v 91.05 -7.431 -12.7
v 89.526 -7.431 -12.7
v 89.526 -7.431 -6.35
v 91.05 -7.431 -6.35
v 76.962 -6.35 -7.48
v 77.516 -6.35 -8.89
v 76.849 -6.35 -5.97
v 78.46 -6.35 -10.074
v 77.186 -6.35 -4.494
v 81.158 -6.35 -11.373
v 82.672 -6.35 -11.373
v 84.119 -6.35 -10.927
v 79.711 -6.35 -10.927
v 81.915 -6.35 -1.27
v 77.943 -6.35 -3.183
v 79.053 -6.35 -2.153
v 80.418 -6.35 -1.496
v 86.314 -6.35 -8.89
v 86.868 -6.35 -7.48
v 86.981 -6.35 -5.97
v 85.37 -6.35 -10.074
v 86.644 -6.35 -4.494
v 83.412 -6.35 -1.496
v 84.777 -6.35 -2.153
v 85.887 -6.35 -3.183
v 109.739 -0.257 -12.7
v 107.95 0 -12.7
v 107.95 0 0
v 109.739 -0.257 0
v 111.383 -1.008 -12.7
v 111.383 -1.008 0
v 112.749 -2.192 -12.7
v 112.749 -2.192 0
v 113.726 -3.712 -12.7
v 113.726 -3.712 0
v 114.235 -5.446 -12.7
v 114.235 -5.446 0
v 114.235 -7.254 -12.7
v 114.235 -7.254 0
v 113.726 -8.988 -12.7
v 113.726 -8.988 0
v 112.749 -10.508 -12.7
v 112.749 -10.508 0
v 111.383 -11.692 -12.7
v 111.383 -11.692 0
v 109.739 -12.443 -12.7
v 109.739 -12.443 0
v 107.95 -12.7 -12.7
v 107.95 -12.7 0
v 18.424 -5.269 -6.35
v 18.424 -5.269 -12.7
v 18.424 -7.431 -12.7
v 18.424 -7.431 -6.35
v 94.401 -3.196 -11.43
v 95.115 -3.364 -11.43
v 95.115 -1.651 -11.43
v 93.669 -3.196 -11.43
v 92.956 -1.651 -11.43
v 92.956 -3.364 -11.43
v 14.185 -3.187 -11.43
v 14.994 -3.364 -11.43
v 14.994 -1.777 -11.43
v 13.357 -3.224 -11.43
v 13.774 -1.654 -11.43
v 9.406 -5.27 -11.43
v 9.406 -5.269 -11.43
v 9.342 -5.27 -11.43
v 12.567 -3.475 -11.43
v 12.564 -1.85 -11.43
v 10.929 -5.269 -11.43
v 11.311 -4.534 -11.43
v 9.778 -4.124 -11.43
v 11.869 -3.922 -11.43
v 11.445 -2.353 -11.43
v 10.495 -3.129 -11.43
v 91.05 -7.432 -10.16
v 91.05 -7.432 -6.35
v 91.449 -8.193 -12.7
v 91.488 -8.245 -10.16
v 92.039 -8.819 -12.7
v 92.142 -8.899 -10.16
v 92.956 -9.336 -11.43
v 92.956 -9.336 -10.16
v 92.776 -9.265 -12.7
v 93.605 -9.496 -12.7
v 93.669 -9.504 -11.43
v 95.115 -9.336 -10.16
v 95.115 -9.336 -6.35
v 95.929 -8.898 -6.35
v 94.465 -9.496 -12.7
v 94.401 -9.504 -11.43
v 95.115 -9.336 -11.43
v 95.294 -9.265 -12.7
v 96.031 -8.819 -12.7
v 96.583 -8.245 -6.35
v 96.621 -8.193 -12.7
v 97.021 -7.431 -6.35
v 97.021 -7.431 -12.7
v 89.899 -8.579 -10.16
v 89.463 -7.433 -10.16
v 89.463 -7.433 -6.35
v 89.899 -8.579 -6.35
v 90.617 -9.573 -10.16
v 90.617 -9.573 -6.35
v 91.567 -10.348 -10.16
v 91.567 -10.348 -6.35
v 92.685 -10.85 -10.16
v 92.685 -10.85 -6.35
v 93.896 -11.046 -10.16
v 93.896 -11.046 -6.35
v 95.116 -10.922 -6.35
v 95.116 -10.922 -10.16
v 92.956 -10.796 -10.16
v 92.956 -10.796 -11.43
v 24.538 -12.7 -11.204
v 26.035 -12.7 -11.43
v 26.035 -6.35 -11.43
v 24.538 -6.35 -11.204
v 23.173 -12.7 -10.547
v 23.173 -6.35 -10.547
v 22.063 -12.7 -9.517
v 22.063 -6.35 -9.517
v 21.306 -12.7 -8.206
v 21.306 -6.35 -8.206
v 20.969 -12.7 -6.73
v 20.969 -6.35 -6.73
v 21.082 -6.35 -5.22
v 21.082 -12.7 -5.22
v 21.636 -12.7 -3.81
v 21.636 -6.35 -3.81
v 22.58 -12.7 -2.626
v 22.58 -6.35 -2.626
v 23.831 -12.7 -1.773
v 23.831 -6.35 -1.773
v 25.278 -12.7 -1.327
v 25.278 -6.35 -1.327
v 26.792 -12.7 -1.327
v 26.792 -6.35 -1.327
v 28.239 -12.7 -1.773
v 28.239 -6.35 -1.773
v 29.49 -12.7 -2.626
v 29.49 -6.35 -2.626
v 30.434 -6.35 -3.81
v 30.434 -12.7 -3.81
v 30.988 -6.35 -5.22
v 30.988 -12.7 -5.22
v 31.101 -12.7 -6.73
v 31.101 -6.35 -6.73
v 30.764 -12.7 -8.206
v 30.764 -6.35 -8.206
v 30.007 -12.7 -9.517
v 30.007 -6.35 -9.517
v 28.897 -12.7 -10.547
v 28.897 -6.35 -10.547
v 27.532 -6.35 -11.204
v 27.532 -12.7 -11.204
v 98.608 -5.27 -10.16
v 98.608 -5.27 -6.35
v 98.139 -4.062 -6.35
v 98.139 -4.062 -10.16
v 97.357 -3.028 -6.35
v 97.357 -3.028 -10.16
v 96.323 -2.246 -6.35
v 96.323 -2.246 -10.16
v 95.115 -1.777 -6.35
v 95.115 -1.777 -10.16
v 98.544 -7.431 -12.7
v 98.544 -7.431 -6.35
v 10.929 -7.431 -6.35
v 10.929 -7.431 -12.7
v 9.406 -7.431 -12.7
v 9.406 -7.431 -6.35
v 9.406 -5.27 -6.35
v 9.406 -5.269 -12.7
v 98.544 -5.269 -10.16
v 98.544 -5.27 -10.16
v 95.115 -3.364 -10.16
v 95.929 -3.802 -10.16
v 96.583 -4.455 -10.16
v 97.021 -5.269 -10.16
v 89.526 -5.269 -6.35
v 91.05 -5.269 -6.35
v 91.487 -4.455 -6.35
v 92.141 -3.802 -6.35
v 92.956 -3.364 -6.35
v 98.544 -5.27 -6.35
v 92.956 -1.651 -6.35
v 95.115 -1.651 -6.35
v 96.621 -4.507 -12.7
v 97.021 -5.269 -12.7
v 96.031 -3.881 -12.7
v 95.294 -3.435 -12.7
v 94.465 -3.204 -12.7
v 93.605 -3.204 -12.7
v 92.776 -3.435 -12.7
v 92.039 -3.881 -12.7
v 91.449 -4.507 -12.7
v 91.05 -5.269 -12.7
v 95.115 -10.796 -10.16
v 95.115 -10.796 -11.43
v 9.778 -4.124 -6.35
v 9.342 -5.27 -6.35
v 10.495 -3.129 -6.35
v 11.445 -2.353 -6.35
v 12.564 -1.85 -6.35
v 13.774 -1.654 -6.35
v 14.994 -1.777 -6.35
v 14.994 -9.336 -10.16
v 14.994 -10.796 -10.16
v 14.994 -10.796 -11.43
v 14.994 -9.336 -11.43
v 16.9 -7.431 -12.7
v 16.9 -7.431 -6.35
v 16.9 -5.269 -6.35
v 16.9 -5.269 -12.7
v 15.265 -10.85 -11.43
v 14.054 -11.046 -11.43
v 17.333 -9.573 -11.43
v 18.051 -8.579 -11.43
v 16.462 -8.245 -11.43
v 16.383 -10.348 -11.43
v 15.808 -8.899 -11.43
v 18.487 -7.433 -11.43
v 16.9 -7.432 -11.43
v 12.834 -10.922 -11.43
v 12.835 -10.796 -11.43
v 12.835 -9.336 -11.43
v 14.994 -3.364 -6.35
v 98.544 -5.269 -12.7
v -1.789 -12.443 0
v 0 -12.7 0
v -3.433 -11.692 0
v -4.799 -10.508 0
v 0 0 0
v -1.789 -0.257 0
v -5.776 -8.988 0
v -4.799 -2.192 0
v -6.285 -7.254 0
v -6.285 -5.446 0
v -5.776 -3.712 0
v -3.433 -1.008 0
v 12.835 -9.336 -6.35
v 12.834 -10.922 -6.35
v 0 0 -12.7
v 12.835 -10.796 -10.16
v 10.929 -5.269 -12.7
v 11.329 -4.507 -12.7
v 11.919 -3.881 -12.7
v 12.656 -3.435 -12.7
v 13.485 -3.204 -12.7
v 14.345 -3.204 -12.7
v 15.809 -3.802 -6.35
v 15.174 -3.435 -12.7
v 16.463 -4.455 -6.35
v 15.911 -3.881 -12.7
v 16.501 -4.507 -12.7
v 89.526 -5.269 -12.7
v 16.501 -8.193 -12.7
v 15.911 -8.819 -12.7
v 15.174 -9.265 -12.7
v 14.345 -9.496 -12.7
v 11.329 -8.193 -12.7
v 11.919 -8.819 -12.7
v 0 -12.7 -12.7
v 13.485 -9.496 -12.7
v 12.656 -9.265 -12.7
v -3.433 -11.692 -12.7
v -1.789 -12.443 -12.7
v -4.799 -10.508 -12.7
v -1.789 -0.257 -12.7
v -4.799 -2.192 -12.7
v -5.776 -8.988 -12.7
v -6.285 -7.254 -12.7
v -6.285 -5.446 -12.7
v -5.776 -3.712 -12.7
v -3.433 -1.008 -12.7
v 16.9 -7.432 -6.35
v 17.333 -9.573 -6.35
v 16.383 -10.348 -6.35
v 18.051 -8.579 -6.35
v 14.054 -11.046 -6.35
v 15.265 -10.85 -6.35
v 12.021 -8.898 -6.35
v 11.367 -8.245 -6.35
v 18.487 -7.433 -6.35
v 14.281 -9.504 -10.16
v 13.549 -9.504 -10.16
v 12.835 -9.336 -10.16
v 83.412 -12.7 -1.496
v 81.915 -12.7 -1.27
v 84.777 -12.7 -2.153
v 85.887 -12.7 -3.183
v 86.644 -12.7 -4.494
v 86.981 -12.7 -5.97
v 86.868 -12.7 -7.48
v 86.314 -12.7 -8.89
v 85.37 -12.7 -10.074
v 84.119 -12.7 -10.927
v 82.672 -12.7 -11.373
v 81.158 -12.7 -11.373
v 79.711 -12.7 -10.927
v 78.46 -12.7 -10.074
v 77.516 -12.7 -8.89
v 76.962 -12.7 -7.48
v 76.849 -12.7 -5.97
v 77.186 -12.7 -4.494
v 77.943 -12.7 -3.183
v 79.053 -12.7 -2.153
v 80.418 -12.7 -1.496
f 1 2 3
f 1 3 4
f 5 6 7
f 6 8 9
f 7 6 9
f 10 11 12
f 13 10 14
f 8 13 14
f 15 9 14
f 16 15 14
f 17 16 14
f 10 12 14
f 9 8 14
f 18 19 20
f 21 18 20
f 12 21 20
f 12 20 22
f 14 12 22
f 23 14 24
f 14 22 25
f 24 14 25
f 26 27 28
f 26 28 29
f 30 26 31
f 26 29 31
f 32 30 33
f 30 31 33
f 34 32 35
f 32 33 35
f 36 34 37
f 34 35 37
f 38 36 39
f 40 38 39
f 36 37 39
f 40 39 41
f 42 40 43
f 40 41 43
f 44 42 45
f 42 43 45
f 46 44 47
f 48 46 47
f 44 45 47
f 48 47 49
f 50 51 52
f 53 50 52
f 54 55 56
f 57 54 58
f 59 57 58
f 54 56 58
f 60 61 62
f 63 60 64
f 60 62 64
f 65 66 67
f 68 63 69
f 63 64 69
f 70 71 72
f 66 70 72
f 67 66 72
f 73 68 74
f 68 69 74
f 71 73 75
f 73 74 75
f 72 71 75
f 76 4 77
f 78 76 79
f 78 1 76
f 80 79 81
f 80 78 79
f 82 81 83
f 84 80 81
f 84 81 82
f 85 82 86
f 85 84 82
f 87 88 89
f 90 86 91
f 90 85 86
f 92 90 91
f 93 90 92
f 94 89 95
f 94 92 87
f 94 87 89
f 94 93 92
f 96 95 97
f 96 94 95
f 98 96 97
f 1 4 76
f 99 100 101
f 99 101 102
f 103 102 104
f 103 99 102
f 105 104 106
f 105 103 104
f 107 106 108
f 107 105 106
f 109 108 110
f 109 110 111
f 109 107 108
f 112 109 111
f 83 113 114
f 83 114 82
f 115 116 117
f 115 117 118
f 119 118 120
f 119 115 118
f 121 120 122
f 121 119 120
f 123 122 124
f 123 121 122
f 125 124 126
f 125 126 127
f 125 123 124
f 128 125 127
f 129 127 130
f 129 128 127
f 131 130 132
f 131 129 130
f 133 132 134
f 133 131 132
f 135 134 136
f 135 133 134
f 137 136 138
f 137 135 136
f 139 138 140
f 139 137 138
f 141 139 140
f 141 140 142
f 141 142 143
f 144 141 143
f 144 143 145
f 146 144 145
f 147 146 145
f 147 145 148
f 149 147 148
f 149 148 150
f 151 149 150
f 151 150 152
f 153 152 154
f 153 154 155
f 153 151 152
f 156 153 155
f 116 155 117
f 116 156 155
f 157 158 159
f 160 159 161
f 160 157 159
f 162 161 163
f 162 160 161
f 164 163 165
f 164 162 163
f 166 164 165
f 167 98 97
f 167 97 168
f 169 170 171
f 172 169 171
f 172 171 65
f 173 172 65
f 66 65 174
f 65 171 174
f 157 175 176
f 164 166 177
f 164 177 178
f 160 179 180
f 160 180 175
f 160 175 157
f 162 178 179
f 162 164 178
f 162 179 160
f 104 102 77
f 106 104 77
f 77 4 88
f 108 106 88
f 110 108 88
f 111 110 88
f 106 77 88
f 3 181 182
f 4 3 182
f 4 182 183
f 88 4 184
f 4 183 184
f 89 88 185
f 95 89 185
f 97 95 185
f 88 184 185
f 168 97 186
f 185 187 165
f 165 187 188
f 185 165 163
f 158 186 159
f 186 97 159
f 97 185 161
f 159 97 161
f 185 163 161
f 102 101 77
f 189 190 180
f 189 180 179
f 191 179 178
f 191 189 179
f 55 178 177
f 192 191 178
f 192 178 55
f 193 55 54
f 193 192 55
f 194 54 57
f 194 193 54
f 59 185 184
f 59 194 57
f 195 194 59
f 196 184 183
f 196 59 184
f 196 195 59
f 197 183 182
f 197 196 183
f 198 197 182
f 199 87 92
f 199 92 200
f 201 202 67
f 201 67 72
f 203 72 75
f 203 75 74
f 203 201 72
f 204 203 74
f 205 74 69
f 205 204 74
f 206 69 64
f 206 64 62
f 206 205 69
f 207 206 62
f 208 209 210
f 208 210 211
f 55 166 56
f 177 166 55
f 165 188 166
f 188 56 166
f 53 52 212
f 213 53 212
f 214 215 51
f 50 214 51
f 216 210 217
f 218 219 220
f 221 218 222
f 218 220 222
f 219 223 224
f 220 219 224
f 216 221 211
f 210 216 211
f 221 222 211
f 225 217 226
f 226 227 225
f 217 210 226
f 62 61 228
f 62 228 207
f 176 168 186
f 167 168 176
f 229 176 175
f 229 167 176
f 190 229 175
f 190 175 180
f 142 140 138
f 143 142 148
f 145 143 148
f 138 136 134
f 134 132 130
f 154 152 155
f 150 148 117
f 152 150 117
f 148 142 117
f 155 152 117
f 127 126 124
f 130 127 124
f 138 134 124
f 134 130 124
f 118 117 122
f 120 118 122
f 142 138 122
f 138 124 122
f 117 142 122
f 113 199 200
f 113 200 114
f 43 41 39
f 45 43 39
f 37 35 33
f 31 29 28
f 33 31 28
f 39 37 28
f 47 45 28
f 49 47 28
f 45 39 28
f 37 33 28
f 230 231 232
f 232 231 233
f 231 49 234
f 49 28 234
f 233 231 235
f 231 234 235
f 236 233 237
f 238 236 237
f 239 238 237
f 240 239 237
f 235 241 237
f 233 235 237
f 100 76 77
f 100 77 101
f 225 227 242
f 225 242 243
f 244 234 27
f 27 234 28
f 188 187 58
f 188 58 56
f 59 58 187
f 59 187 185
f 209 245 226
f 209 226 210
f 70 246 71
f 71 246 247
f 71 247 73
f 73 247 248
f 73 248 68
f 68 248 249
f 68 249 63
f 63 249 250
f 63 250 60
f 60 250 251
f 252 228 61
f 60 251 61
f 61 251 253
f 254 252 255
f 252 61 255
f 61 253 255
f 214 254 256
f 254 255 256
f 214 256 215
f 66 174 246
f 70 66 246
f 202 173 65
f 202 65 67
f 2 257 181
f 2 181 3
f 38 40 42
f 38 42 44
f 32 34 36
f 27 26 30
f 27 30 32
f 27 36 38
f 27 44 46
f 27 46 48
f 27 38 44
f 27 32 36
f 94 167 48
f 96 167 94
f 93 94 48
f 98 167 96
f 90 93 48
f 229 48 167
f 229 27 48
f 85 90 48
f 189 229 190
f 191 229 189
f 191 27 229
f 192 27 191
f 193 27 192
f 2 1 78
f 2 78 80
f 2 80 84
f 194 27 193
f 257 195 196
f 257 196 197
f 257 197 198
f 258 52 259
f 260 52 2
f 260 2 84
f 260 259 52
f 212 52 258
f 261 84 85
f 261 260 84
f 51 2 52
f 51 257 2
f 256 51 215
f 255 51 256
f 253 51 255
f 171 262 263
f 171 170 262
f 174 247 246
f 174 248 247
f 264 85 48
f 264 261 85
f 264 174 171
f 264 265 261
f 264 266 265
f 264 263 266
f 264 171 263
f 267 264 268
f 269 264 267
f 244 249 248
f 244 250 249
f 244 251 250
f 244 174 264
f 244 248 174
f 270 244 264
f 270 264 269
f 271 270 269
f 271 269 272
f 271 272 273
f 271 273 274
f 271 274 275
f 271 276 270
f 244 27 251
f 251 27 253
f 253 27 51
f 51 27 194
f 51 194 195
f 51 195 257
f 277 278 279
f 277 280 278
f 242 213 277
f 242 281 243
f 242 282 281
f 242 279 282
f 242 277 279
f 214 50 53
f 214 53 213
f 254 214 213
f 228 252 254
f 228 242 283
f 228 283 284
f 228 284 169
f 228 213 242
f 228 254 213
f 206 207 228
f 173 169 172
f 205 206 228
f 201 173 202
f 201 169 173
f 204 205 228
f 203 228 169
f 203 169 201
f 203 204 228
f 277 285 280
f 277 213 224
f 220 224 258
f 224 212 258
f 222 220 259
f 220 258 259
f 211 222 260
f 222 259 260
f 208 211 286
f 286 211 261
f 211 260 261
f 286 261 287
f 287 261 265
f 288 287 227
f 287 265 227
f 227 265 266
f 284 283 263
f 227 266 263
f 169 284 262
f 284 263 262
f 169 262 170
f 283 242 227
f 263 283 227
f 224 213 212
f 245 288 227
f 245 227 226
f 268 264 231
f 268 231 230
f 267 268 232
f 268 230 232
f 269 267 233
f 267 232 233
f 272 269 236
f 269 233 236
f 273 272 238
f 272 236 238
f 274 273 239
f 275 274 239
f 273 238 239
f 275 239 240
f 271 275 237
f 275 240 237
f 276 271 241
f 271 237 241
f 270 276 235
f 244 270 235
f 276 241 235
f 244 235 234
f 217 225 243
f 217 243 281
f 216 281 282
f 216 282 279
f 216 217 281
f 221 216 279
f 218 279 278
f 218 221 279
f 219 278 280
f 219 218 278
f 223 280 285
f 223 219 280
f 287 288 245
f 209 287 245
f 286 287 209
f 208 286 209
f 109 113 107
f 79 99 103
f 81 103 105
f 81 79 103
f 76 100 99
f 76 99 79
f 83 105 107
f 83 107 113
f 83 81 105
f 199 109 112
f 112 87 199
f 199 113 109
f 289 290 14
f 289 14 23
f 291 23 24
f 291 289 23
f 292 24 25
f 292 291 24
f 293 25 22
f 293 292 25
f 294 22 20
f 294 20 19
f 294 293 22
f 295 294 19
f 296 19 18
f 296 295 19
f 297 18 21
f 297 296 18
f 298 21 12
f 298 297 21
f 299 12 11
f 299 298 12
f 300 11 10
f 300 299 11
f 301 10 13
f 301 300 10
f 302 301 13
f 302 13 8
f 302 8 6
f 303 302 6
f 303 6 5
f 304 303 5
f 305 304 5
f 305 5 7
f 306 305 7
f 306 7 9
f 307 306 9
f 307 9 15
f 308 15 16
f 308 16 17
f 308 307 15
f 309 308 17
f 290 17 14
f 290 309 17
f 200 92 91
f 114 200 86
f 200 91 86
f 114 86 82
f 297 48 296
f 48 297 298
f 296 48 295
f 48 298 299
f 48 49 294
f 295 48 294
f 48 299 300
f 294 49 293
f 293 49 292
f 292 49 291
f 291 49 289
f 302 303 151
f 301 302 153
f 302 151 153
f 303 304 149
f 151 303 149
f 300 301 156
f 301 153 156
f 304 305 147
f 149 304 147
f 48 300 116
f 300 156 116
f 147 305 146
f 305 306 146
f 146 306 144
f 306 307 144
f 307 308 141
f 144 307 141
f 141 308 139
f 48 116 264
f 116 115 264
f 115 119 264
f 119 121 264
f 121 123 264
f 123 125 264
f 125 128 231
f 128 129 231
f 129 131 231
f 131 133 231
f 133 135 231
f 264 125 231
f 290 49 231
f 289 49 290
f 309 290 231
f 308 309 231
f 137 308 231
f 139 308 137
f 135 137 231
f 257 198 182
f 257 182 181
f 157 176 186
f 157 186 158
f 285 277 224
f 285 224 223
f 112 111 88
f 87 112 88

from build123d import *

# Parameters (mm, degrees)
BOSS_EXTRUDE1_DEPTH = 12.7
CUT_EXTRUDE1_DEPTH  = 6.35
CUT_EXTRUDE4_START  = 3.81
CUT_EXTRUDE4_DEPTH  = 3.81
CUT_EXTRUDE5_DEPTH  = 5.08
SKETCH5_R           = 5.08
CUT_EXTRUDE6_DEPTH  = 6.35


# Read off the part's stored shape, not the designer's step: Cut-Extrude5
with BuildPart() as part:
    # Sketch1 → Boss-Extrude1 (new body)
    with BuildSketch(Plane.XY):
        with BuildLine():
            Line((0, 0), (107.95, 0))
            ThreePointArc((107.95, 0), (114.3, -6.35), (107.95, -12.7))
            Line((107.95, -12.7), (0, -12.7))
            ThreePointArc((0, -12.7), (-6.35, -6.35), (0, 0))
        make_face()
    extrude(amount=-BOSS_EXTRUDE1_DEPTH)

    # Sketch2 → Cut-Extrude1 (cut)
    with BuildSketch(Plane(origin=(0, 0, -12.7), x_dir=(-1, 0, 0), z_dir=(0, 0, -1))):
        with BuildLine():
            Line((-98.543781691, -5.269443984), (-97.020546117, -5.269443984))
            ThreePointArc((-97.020546117, -5.269443984), (-94.03507736, -3.175), (-91.049608603, -5.269443984))
            Line((-91.049608603, -5.269443984), (-89.526373029, -5.269443984))
            Line((-89.526373029, -5.269443984), (-89.526373029, -7.430556016))
            Line((-89.526373029, -7.430556016), (-91.049608603, -7.430556016))
            ThreePointArc((-91.049608603, -7.430556016), (-94.03507736, -9.525), (-97.020546117, -7.430556016))
            Line((-97.020546117, -7.430556016), (-98.543781691, -7.430556016))
            Line((-98.543781691, -7.430556016), (-98.543781691, -5.269443984))
        make_face()
        with BuildLine():
            Line((-18.423626971, -5.269443984), (-18.423626971, -7.430556016))
            Line((-18.423626971, -7.430556016), (-16.900391397, -7.430556016))
            ThreePointArc((-16.900391397, -7.430556016), (-13.91492264, -9.525), (-10.929453883, -7.430556016))
            Line((-10.929453883, -7.430556016), (-9.406218309, -7.430556016))
            Line((-9.406218309, -7.430556016), (-9.406218309, -5.269443984))
            Line((-9.406218309, -5.269443984), (-10.929453883, -5.269443984))
            ThreePointArc((-10.929453883, -5.269443984), (-13.91492264, -3.175), (-16.900391397, -5.269443984))
            Line((-16.900391397, -5.269443984), (-18.423626971, -5.269443984))
        make_face()
    extrude(amount=-CUT_EXTRUDE1_DEPTH, mode=Mode.SUBTRACT)

    # Sketch3 → Cut-Extrude4 (cut)
    with BuildSketch(Plane(origin=(0, 0, -6.35), x_dir=(-1, 0, 0), z_dir=(0, 0, -1)).offset(CUT_EXTRUDE4_START)):
        with BuildLine():
            ThreePointArc((-14.99442264, -1.777413667), (-11.444937607, -2.353371426), (-9.342336307, -5.2705))
            Line((-9.342336307, -5.2705), (-10.929071882, -5.2705))
            ThreePointArc((-10.929071882, -5.2705), (-12.566929092, -3.475362911), (-14.99442264, -3.364149242))
            Line((-14.99442264, -3.364149242), (-14.99442264, -1.777413667))
        make_face()
        with BuildLine():
            ThreePointArc((-12.834322649, -10.922326506), (-16.383098929, -10.347745843), (-18.486790701, -7.432537968))
            Line((-18.486790701, -7.432537968), (-16.900008973, -7.431612032))
            ThreePointArc((-16.900008973, -7.431612032), (-15.26155345, -9.225275719), (-12.834704368, -9.335590978))
            Line((-12.834704368, -9.335590978), (-12.834322649, -10.922326506))
        make_face()
        with BuildLine():
            ThreePointArc((-95.115295632, -9.335590978), (-92.68844655, -9.225275719), (-91.049991027, -7.431612032))
            Line((-91.049991027, -7.431612032), (-89.463209299, -7.432537968))
            ThreePointArc((-89.463209299, -7.432537968), (-91.566901071, -10.347745843), (-95.115677351, -10.922326506))
            Line((-95.115677351, -10.922326506), (-95.115295632, -9.335590978))
        make_face()
        with BuildLine():
            ThreePointArc((-92.95557736, -3.364149242), (-95.383070908, -3.475362911), (-97.020928118, -5.2705))
            Line((-97.020928118, -5.2705), (-98.607663693, -5.2705))
            ThreePointArc((-98.607663693, -5.2705), (-96.505062393, -2.353371426), (-92.95557736, -1.777413667))
            Line((-92.95557736, -1.777413667), (-92.95557736, -3.364149242))
        make_face()
    extrude(amount=-CUT_EXTRUDE4_DEPTH, mode=Mode.SUBTRACT)

    # Cut-Extrude5 outline → Cut-Extrude5 (cut)
    with BuildSketch(Plane(origin=(0, 0, -6.35), x_dir=(-1, 0, 0), z_dir=(0, 0, -1))):
        with BuildLine():
            ThreePointArc((-9.342336307, -5.2705), (-11.444937607, -2.353371426), (-14.99442264, -1.777413667))
            Line((-14.99442264, -1.777413667), (-14.99442264, -3.364149242))
            ThreePointArc((-14.99442264, -3.364149242), (-12.567437486, -3.475124566), (-10.929453883, -5.269443984))
            Line((-10.929453883, -5.269443984), (-9.406218309, -5.269443984))
            Line((-9.406218309, -5.269443984), (-9.406218309, -5.2705))
            Line((-9.406218309, -5.2705), (-9.342336307, -5.2705))
        make_face()
        with BuildLine():
            ThreePointArc((-18.486790701, -7.432537968), (-16.383098929, -10.347745843), (-12.834322649, -10.922326506))
            Line((-12.834322649, -10.922326506), (-12.834704368, -9.335590978))
            ThreePointArc((-12.834704368, -9.335590978), (-12.835063496, -9.335720889), (-12.83542264, -9.335850758))
            Line((-12.83542264, -9.335850758), (-12.83542264, -10.796172665))
            Line((-12.83542264, -10.796172665), (-14.99442264, -10.796172665))
            Line((-14.99442264, -10.796172665), (-14.99442264, -9.335850758))
            ThreePointArc((-14.99442264, -9.335850758), (-16.159192409, -8.595858011), (-16.900008973, -7.431612032))
            Line((-16.900008973, -7.431612032), (-18.486790701, -7.432537968))
        make_face()
        with BuildLine():
            ThreePointArc((-95.11457736, -3.364149242), (-94.03507736, -3.175), (-92.95557736, -3.364149242))
            Line((-92.95557736, -3.364149242), (-92.95557736, -1.651))
            Line((-92.95557736, -1.651), (-95.11457736, -1.651))
            Line((-95.11457736, -1.651), (-95.11457736, -3.364149242))
        make_face()
        with BuildLine():
            Line((-92.95557736, -10.796172665), (-92.95557736, -9.335850758))
            ThreePointArc((-92.95557736, -9.335850758), (-94.03507736, -9.525), (-95.11457736, -9.335850758))
            Line((-95.11457736, -9.335850758), (-95.11457736, -10.796172665))
            Line((-95.11457736, -10.796172665), (-92.95557736, -10.796172665))
        make_face()
    extrude(amount=CUT_EXTRUDE5_DEPTH, mode=Mode.SUBTRACT)

    # Sketch5 → Cut-Extrude6 (cut)
    with BuildSketch(Plane(origin=(0, -12.7, 0), x_dir=(1, 0, 0), z_dir=(0, 1, 0))):
        with Locations(Location((81.915, 6.35, 0), (0, 0, 270))):
            Circle(SKETCH5_R)
        with Locations(Location((26.035, 6.35, 0), (0, 0, 90))):
            Circle(SKETCH5_R)
    extrude(amount=CUT_EXTRUDE6_DEPTH, mode=Mode.SUBTRACT)


solid = part.part
